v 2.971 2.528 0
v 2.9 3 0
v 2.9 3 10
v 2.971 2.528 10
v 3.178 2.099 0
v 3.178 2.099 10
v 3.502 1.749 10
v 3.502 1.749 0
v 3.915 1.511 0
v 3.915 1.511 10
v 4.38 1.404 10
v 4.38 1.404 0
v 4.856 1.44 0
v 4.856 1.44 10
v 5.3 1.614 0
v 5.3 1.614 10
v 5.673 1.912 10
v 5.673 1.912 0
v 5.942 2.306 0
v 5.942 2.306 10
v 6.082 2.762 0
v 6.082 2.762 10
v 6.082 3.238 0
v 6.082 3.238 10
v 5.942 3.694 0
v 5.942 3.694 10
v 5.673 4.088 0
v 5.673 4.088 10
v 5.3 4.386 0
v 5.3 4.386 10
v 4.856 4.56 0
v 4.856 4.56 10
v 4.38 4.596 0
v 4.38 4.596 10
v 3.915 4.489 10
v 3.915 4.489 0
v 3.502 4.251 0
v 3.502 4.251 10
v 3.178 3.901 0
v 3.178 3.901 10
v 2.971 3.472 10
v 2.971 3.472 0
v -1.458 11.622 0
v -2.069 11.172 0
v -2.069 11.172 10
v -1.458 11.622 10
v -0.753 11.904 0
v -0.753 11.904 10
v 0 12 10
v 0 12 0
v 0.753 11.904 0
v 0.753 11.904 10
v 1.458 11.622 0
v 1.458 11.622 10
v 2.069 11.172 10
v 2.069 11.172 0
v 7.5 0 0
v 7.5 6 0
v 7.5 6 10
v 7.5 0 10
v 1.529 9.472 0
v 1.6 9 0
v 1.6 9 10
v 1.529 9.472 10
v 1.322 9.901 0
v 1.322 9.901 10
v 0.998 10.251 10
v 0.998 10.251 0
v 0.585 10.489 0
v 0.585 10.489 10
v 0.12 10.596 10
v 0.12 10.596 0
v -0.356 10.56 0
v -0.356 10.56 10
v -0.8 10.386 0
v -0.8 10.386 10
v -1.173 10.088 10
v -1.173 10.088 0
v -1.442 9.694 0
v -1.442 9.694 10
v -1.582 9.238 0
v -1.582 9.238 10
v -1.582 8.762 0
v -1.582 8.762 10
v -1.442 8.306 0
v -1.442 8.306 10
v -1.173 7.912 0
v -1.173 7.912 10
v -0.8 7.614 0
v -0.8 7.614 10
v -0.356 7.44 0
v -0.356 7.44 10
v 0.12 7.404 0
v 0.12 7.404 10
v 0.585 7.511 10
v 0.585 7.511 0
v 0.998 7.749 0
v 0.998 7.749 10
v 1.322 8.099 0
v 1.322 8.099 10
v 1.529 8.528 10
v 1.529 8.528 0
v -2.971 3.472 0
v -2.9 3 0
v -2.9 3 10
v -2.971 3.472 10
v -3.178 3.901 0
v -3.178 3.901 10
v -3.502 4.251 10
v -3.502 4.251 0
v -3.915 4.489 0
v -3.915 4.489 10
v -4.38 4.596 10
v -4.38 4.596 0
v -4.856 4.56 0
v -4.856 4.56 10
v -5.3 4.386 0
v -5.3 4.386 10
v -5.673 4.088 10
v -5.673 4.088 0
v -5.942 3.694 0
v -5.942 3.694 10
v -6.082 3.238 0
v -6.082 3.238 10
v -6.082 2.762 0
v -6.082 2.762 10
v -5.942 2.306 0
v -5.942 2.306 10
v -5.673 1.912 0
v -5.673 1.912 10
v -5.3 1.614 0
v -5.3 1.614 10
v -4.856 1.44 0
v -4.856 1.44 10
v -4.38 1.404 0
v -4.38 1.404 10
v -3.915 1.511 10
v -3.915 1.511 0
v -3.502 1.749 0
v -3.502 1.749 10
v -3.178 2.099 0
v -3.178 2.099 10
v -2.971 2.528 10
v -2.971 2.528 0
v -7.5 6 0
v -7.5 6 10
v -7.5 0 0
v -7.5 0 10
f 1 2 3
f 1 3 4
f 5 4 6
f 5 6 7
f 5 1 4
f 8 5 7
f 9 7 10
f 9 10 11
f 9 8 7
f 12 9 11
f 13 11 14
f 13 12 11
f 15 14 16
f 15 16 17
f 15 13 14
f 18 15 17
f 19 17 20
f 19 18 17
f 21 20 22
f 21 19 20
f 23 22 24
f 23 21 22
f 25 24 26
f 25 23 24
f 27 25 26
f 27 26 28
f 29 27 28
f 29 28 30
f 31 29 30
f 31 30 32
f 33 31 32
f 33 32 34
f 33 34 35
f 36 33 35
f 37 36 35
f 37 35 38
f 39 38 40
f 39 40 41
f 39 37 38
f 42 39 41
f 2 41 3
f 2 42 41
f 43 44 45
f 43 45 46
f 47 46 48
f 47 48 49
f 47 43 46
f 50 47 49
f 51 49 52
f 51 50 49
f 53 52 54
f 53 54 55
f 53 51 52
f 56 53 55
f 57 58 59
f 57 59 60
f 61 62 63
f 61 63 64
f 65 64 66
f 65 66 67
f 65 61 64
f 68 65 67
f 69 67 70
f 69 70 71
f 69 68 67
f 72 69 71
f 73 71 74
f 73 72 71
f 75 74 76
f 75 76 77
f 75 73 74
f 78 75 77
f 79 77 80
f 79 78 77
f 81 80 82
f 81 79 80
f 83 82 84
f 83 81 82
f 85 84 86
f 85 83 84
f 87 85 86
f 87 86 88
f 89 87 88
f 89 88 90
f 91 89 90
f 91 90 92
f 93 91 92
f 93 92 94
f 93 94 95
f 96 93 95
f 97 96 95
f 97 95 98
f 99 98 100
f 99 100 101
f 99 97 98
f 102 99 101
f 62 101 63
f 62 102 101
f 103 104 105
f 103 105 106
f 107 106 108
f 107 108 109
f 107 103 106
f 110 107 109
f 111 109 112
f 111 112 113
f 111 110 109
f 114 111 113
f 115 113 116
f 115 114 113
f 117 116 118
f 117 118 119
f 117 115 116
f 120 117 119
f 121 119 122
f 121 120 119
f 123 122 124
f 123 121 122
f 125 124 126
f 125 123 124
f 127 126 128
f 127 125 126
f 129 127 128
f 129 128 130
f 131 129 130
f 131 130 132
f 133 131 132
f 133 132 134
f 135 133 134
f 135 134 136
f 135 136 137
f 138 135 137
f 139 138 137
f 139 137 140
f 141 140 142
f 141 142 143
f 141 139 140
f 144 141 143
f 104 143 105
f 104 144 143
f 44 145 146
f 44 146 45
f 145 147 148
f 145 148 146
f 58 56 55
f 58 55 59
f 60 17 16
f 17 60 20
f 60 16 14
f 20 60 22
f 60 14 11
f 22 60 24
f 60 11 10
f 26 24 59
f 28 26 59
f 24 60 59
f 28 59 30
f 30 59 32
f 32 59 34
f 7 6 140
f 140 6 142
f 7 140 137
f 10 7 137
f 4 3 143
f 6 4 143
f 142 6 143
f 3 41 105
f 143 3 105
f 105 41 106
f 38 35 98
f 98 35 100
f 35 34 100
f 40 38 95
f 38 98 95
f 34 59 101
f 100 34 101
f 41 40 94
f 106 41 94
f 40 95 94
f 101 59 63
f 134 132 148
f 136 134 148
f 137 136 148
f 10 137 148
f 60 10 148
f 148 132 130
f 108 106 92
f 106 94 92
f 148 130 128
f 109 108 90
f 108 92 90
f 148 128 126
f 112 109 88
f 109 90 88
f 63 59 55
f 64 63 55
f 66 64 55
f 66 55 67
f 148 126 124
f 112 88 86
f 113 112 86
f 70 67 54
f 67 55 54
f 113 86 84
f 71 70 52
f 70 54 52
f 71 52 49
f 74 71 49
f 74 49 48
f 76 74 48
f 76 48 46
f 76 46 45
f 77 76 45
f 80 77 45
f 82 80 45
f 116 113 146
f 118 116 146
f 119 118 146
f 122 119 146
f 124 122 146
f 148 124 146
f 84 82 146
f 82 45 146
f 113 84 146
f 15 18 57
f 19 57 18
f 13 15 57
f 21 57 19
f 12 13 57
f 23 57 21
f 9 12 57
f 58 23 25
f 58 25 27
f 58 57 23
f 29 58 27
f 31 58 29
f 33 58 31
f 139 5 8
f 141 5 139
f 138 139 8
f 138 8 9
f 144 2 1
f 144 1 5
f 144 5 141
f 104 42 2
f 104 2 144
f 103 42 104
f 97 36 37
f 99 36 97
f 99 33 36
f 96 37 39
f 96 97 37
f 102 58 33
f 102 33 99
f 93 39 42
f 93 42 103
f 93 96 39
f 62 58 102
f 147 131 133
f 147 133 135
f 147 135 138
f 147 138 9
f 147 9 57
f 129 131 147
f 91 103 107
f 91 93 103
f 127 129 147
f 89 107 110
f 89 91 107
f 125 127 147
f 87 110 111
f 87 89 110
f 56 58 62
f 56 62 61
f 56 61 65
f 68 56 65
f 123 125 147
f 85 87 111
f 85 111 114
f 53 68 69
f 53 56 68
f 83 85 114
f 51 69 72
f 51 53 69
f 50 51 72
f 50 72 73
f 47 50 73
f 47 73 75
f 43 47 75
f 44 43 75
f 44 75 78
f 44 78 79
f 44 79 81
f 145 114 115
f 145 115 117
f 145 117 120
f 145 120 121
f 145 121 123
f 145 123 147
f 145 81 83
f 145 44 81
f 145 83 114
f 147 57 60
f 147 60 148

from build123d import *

# Parameters (mm, degrees)
SKETCH1_R           = 1.6
BOSS_EXTRUDE1_DEPTH = 10


with BuildPart() as part:
    # Sketch1 → Boss-Extrude1 (new body)
    with BuildSketch(Plane.XY):
        with BuildLine():
            Line((-7.5, 6), (-2.068965517, 11.172413793))
            ThreePointArc((-2.068965517, 11.172413793), (0, 12), (2.068965517, 11.172413793))
            Line((2.068965517, 11.172413793), (7.5, 6))
            Line((7.5, 6), (7.5, 0))
            Line((7.5, 0), (-7.5, 0))
            Line((-7.5, 0), (-7.5, 6))
        make_face()
        with Locations((0, 9)):
            Circle(SKETCH1_R, mode=Mode.SUBTRACT)
        with Locations((-4.5, 3)):
            Circle(SKETCH1_R, mode=Mode.SUBTRACT)
        with Locations(Location((4.5, 3, 0), (0, 0, 180))):
            Circle(SKETCH1_R, mode=Mode.SUBTRACT)
    extrude(amount=BOSS_EXTRUDE1_DEPTH)


solid = part.part
